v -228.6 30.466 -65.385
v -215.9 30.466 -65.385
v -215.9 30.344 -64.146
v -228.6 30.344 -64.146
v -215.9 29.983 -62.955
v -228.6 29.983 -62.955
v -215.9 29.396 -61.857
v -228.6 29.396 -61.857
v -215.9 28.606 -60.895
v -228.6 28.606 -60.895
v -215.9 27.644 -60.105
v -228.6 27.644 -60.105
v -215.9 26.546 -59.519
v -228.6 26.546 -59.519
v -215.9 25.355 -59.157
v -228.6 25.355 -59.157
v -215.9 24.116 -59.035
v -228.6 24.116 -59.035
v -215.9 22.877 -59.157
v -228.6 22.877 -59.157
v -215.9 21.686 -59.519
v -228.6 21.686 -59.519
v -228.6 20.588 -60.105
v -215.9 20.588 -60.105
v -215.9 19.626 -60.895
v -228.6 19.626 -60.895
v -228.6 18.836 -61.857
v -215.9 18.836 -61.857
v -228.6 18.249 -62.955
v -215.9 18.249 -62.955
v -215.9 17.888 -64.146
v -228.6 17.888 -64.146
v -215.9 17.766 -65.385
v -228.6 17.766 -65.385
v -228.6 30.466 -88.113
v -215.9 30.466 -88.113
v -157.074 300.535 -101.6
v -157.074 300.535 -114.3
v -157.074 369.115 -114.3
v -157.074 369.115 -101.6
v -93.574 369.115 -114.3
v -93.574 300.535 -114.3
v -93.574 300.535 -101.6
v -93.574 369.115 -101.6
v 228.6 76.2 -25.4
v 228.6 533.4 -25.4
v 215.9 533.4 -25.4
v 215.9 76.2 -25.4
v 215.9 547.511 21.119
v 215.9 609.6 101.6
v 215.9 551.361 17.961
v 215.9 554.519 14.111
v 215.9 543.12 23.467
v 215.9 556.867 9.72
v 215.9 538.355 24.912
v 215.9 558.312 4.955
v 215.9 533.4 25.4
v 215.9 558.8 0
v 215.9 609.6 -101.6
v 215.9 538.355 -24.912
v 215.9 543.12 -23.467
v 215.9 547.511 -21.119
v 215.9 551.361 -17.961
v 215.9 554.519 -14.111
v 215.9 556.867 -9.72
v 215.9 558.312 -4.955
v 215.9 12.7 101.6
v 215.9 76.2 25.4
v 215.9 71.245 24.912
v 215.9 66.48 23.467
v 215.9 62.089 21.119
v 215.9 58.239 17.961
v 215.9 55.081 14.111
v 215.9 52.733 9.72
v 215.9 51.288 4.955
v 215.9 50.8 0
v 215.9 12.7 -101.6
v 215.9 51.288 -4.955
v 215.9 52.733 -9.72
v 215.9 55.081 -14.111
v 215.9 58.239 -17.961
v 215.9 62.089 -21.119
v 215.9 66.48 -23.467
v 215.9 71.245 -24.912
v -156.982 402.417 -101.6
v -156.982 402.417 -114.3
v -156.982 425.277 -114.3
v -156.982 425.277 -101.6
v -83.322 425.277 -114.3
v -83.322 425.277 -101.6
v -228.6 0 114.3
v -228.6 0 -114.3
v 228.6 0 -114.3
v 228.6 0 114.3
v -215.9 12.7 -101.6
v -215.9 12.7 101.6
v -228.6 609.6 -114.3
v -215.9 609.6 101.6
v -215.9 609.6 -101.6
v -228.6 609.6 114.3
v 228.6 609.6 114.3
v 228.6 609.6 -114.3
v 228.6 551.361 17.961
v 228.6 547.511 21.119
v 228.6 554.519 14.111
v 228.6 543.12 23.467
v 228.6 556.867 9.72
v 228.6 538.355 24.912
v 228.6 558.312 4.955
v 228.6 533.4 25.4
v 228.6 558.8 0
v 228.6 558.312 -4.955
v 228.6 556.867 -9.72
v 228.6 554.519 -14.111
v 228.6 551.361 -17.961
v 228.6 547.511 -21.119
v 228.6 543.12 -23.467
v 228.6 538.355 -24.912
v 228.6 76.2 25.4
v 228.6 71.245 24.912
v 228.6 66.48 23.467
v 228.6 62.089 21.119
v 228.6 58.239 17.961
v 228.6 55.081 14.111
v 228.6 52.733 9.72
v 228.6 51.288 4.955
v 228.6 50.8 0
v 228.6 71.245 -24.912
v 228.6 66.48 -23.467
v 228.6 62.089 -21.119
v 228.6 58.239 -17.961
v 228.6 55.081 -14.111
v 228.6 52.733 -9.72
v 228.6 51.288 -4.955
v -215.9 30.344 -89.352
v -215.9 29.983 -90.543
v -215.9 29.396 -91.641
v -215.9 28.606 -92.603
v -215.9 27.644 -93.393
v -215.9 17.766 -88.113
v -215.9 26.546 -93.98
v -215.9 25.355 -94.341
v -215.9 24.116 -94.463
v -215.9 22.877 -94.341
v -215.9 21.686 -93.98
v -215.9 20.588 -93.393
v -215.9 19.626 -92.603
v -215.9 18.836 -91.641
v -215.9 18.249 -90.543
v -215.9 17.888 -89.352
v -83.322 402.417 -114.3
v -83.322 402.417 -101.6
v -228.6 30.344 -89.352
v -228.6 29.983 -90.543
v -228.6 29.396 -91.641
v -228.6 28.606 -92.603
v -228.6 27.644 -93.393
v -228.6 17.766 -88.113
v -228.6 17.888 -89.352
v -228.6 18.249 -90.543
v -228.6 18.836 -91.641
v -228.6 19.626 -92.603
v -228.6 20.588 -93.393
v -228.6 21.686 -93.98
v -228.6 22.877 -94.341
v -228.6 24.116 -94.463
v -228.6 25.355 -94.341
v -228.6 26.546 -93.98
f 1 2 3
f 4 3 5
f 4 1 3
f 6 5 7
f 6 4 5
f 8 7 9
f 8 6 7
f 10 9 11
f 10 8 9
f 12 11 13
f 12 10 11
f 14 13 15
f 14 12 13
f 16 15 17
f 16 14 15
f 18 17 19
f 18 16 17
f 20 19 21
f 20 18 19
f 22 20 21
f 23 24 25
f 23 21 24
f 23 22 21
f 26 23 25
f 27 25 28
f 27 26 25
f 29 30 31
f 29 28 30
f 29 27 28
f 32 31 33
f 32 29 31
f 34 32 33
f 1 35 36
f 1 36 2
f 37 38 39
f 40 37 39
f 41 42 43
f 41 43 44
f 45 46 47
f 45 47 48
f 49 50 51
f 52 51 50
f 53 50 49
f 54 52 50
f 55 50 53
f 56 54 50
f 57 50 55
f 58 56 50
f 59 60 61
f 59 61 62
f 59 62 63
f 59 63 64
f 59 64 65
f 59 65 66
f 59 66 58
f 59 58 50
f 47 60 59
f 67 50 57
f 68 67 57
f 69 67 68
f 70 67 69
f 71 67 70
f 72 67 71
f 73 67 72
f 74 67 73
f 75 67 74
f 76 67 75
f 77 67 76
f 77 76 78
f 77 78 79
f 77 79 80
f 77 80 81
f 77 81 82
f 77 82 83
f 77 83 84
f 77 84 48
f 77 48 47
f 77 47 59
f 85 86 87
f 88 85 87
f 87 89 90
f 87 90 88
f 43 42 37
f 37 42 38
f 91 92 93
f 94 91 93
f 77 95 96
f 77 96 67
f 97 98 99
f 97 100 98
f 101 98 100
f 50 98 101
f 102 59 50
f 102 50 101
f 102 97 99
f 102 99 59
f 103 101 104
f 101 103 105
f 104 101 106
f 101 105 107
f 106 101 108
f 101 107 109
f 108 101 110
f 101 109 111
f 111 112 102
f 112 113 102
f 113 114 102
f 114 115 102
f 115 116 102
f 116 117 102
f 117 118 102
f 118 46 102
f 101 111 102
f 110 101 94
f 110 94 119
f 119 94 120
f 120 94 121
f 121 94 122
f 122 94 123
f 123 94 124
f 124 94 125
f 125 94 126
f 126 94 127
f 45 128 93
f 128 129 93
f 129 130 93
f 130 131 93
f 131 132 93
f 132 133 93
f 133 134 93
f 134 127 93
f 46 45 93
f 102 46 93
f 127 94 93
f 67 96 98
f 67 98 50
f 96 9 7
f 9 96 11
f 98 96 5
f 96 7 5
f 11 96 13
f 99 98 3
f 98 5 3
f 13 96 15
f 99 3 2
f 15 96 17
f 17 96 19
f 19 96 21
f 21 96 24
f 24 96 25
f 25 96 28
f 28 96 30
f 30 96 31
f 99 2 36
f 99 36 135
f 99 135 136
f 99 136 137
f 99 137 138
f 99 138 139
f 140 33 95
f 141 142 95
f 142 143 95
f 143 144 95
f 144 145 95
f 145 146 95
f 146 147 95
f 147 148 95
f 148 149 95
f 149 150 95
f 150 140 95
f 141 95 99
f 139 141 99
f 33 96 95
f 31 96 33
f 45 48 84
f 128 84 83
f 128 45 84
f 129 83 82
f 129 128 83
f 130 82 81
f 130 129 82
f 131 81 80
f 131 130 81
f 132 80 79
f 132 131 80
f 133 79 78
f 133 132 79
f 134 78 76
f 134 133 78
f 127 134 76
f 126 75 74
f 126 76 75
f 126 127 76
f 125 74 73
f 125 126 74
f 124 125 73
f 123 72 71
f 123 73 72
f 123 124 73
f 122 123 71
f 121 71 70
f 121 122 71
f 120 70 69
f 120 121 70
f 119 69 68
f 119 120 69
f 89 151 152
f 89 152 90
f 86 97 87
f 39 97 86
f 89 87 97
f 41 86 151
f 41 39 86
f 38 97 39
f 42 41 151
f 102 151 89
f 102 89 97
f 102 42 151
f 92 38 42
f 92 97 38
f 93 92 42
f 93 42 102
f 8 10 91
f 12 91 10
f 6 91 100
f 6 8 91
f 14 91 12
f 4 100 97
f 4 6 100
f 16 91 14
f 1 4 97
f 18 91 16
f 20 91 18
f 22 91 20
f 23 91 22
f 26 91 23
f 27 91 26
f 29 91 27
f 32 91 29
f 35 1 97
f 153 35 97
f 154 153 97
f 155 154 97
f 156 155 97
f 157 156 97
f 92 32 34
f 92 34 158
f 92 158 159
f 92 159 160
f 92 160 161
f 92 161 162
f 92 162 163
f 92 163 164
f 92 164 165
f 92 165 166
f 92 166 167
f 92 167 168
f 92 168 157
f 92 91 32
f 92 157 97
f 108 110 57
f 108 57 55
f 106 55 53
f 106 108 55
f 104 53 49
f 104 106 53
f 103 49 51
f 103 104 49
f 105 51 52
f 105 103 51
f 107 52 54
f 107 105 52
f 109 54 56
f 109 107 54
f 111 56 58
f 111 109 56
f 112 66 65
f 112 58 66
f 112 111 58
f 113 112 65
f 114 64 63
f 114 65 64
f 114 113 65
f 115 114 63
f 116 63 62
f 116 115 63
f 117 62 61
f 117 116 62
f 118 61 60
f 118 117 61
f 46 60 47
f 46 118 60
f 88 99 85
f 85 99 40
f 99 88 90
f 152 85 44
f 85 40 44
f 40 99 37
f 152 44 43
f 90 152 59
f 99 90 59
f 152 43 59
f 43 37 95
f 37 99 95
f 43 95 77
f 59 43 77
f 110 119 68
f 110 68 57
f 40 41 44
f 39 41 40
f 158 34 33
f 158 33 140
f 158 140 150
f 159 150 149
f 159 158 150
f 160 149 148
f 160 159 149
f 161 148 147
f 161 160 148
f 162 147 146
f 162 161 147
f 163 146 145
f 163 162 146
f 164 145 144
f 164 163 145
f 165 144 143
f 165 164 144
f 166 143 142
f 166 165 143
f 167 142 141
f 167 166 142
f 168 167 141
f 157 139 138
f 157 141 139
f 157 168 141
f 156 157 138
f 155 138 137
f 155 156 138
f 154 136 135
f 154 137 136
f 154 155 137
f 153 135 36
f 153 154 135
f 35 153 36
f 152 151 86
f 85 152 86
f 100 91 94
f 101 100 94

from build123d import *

# Parameters (mm, degrees)
SKETCH1_W           = 457.2
SKETCH1_H           = 228.6
BOSS_EXTRUDE1_DEPTH = 609.6
SHELL2_T            = -12.7
CUT_EXTRUDE2_REACH  = 772.525
CUT_EXTRUDE3_REACH  = 692.02
SKETCH4_W           = 31.75
SKETCH4_H           = 34.29
SKETCH4_W_2         = 36.83
SKETCH4_H_2         = 11.43
CUT_EXTRUDE17_DEPTH = 55.88


with BuildPart() as part:
    # Sketch1 → Boss-Extrude1 (new body)
    with BuildSketch(Plane(origin=(0, 0, 0), x_dir=(1, 0, 0), z_dir=(0, 1, 0))):
        Rectangle(SKETCH1_W, SKETCH1_H)
    extrude(amount=BOSS_EXTRUDE1_DEPTH)

    # Shell2
    shell2_openings = [part.faces().sort_by_distance(p)[0] for p in [
        (0, 609.6, 0),
    ]]
    offset(amount=SHELL2_T, openings=shell2_openings, kind=Kind.INTERSECTION)

    # Sketch3 → Cut-Extrude2 (cut, up to next)
    with BuildSketch(Plane(origin=(228.6, 0, 0), x_dir=(0, 0, -1), z_dir=(1, 0, 0)), mode=Mode.PRIVATE) as cut_extrude2_sk1:
        with BuildLine():
            Line((-25.4, 76.2), (-25.4, 533.4))
            ThreePointArc((-25.4, 533.4), (0, 558.8), (25.4, 533.4))
            Line((25.4, 533.4), (25.4, 76.2))
            ThreePointArc((25.4, 76.2), (0, 50.8), (-25.4, 76.2))
        make_face()
    cut_extrude2_tool1 = extrude(cut_extrude2_sk1.sketch, amount=-CUT_EXTRUDE2_REACH, mode=Mode.PRIVATE) & part.part
    add(cut_extrude2_tool1.solids().sort_by_distance((228.6, 304.8, 0))[0], mode=Mode.SUBTRACT)

    # Sketch4 → Cut-Extrude3 (cut, up to next)
    with BuildSketch(Plane(origin=(0, 0, -114.3), x_dir=(-1, 0, 0), z_dir=(0, 0, -1)), mode=Mode.PRIVATE) as cut_extrude3_sk1:
        with Locations((109.44862115, 351.970372474)):
            Rectangle(SKETCH4_W, SKETCH4_H)
    cut_extrude3_tool1 = extrude(cut_extrude3_sk1.sketch, amount=-CUT_EXTRUDE3_REACH, mode=Mode.PRIVATE) & part.part
    # Sketch4 → Cut-Extrude3 (cut, up to next)
    with BuildSketch(Plane(origin=(0, 0, -114.3), x_dir=(-1, 0, 0), z_dir=(0, 0, -1)), mode=Mode.PRIVATE) as cut_extrude3_sk2:
        with Locations((109.44862115, 317.680372474)):
            Rectangle(SKETCH4_W, SKETCH4_H)
    cut_extrude3_tool2 = extrude(cut_extrude3_sk2.sketch, amount=-CUT_EXTRUDE3_REACH, mode=Mode.PRIVATE) & part.part
    # Sketch4 → Cut-Extrude3 (cut, up to next)
    with BuildSketch(Plane(origin=(0, 0, -114.3), x_dir=(-1, 0, 0), z_dir=(0, 0, -1)), mode=Mode.PRIVATE) as cut_extrude3_sk3:
        with Locations((141.19862115, 317.680372474)):
            Rectangle(SKETCH4_W, SKETCH4_H)
    cut_extrude3_tool3 = extrude(cut_extrude3_sk3.sketch, amount=-CUT_EXTRUDE3_REACH, mode=Mode.PRIVATE) & part.part
    # Sketch4 → Cut-Extrude3 (cut, up to next)
    with BuildSketch(Plane(origin=(0, 0, -114.3), x_dir=(-1, 0, 0), z_dir=(0, 0, -1)), mode=Mode.PRIVATE) as cut_extrude3_sk4:
        with Locations((141.19862115, 351.970372474)):
            Rectangle(SKETCH4_W, SKETCH4_H)
    cut_extrude3_tool4 = extrude(cut_extrude3_sk4.sketch, amount=-CUT_EXTRUDE3_REACH, mode=Mode.PRIVATE) & part.part
    # Sketch4 → Cut-Extrude3 (cut, up to next)
    with BuildSketch(Plane(origin=(0, 0, -114.3), x_dir=(-1, 0, 0), z_dir=(0, 0, -1)), mode=Mode.PRIVATE) as cut_extrude3_sk5:
        with Locations((138.56658474, 419.56196337)):
            Rectangle(SKETCH4_W_2, SKETCH4_H_2)
    cut_extrude3_tool5 = extrude(cut_extrude3_sk5.sketch, amount=-CUT_EXTRUDE3_REACH, mode=Mode.PRIVATE) & part.part
    # Sketch4 → Cut-Extrude3 (cut, up to next)
    with BuildSketch(Plane(origin=(0, 0, -114.3), x_dir=(-1, 0, 0), z_dir=(0, 0, -1)), mode=Mode.PRIVATE) as cut_extrude3_sk6:
        with Locations((138.56658474, 408.13196337)):
            Rectangle(SKETCH4_W_2, SKETCH4_H_2)
    cut_extrude3_tool6 = extrude(cut_extrude3_sk6.sketch, amount=-CUT_EXTRUDE3_REACH, mode=Mode.PRIVATE) & part.part
    # Sketch4 → Cut-Extrude3 (cut, up to next)
    with BuildSketch(Plane(origin=(0, 0, -114.3), x_dir=(-1, 0, 0), z_dir=(0, 0, -1)), mode=Mode.PRIVATE) as cut_extrude3_sk7:
        with Locations((101.73658474, 419.56196337)):
            Rectangle(SKETCH4_W_2, SKETCH4_H_2)
    cut_extrude3_tool7 = extrude(cut_extrude3_sk7.sketch, amount=-CUT_EXTRUDE3_REACH, mode=Mode.PRIVATE) & part.part
    # Sketch4 → Cut-Extrude3 (cut, up to next)
    with BuildSketch(Plane(origin=(0, 0, -114.3), x_dir=(-1, 0, 0), z_dir=(0, 0, -1)), mode=Mode.PRIVATE) as cut_extrude3_sk8:
        with Locations((101.73658474, 408.13196337)):
            Rectangle(SKETCH4_W_2, SKETCH4_H_2)
    cut_extrude3_tool8 = extrude(cut_extrude3_sk8.sketch, amount=-CUT_EXTRUDE3_REACH, mode=Mode.PRIVATE) & part.part
    add(cut_extrude3_tool1.solids().sort_by_distance((-109.448621, 351.970372, -114.3))[0], mode=Mode.SUBTRACT)
    add(cut_extrude3_tool2.solids().sort_by_distance((-109.448621, 317.680372, -114.3))[0], mode=Mode.SUBTRACT)
    add(cut_extrude3_tool3.solids().sort_by_distance((-141.198621, 317.680372, -114.3))[0], mode=Mode.SUBTRACT)
    add(cut_extrude3_tool4.solids().sort_by_distance((-141.198621, 351.970372, -114.3))[0], mode=Mode.SUBTRACT)
    add(cut_extrude3_tool5.solids().sort_by_distance((-138.566585, 419.561963, -114.3))[0], mode=Mode.SUBTRACT)
    add(cut_extrude3_tool6.solids().sort_by_distance((-138.566585, 408.131963, -114.3))[0], mode=Mode.SUBTRACT)
    add(cut_extrude3_tool7.solids().sort_by_distance((-101.736585, 419.561963, -114.3))[0], mode=Mode.SUBTRACT)
    add(cut_extrude3_tool8.solids().sort_by_distance((-101.736585, 408.131963, -114.3))[0], mode=Mode.SUBTRACT)

    # Sketch11 → Cut-Extrude17 (cut)
    with BuildSketch(Plane.ZY.offset(228.6)):
        with BuildLine():
            Line((-65.38521106, 17.765922532), (-88.113220021, 17.765922532))
            ThreePointArc((-88.113220021, 17.765922532), (-94.463220021, 24.115922532), (-88.113220021, 30.465922532))
            Line((-88.113220021, 30.465922532), (-65.38521106, 30.465922532))
            ThreePointArc((-65.38521106, 30.465922532), (-59.03521106, 24.115922532), (-65.38521106, 17.765922532))
        make_face()
    extrude(amount=-CUT_EXTRUDE17_DEPTH, mode=Mode.SUBTRACT)


solid = part.part
